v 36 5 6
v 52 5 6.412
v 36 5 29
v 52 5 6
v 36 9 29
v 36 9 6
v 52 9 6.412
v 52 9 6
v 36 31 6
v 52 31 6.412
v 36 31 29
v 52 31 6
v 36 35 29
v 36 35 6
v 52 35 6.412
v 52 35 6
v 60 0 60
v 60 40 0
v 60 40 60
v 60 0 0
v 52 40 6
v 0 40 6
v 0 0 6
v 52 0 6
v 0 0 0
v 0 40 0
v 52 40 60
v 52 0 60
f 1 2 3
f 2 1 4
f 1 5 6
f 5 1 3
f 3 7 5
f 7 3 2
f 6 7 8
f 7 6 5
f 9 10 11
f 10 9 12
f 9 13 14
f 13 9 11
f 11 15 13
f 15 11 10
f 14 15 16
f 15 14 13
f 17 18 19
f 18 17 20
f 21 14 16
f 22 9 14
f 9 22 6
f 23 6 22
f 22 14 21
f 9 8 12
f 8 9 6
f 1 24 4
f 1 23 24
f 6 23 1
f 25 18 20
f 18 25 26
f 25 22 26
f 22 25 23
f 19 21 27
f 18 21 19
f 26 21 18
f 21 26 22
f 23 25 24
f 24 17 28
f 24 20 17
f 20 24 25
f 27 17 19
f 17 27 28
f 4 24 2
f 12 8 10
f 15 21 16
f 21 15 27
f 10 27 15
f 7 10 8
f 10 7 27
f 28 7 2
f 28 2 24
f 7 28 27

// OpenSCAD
$fn = 32;

// ----------------------------------------------------------------------
// Rib bracket: 2-gusset L bracket
// ----------------------------------------------------------------------

// --- parameters (mm) ---
base_l = 60;              // foot length, X
base_w = 40;              // foot width, Y
base_t = 6;               // foot thickness
plate_t = 8;              // upright plate thickness
plate_h = 60;             // overall height
gus_l = 16;               // gusset leg along the foot
gus_h = 24;               // gusset height
gus_t = 4;                // gusset thickness
gus_edge = 5;             // gusset margin from the foot edge
n_gus = 2;                // gusset count

gus_pitch = (base_w - 2 * gus_edge - gus_t) / (n_gus - 1);  // gusset pitch

union() {
  cube([base_l, base_w, base_t]);
  translate([base_l - plate_t, 0, base_t - 1])
    cube([plate_t, base_w, plate_h - base_t + 1]);
  for (i = [0 : n_gus - 1])
    translate([base_l - plate_t - gus_l, gus_edge + i * gus_pitch, base_t - 1])
      rotate([-90, 0, 0])
        linear_extrude(height = gus_t)
          polygon(points = [[0, 0], [gus_l + 1, 0], [0, -gus_h]]);
}
